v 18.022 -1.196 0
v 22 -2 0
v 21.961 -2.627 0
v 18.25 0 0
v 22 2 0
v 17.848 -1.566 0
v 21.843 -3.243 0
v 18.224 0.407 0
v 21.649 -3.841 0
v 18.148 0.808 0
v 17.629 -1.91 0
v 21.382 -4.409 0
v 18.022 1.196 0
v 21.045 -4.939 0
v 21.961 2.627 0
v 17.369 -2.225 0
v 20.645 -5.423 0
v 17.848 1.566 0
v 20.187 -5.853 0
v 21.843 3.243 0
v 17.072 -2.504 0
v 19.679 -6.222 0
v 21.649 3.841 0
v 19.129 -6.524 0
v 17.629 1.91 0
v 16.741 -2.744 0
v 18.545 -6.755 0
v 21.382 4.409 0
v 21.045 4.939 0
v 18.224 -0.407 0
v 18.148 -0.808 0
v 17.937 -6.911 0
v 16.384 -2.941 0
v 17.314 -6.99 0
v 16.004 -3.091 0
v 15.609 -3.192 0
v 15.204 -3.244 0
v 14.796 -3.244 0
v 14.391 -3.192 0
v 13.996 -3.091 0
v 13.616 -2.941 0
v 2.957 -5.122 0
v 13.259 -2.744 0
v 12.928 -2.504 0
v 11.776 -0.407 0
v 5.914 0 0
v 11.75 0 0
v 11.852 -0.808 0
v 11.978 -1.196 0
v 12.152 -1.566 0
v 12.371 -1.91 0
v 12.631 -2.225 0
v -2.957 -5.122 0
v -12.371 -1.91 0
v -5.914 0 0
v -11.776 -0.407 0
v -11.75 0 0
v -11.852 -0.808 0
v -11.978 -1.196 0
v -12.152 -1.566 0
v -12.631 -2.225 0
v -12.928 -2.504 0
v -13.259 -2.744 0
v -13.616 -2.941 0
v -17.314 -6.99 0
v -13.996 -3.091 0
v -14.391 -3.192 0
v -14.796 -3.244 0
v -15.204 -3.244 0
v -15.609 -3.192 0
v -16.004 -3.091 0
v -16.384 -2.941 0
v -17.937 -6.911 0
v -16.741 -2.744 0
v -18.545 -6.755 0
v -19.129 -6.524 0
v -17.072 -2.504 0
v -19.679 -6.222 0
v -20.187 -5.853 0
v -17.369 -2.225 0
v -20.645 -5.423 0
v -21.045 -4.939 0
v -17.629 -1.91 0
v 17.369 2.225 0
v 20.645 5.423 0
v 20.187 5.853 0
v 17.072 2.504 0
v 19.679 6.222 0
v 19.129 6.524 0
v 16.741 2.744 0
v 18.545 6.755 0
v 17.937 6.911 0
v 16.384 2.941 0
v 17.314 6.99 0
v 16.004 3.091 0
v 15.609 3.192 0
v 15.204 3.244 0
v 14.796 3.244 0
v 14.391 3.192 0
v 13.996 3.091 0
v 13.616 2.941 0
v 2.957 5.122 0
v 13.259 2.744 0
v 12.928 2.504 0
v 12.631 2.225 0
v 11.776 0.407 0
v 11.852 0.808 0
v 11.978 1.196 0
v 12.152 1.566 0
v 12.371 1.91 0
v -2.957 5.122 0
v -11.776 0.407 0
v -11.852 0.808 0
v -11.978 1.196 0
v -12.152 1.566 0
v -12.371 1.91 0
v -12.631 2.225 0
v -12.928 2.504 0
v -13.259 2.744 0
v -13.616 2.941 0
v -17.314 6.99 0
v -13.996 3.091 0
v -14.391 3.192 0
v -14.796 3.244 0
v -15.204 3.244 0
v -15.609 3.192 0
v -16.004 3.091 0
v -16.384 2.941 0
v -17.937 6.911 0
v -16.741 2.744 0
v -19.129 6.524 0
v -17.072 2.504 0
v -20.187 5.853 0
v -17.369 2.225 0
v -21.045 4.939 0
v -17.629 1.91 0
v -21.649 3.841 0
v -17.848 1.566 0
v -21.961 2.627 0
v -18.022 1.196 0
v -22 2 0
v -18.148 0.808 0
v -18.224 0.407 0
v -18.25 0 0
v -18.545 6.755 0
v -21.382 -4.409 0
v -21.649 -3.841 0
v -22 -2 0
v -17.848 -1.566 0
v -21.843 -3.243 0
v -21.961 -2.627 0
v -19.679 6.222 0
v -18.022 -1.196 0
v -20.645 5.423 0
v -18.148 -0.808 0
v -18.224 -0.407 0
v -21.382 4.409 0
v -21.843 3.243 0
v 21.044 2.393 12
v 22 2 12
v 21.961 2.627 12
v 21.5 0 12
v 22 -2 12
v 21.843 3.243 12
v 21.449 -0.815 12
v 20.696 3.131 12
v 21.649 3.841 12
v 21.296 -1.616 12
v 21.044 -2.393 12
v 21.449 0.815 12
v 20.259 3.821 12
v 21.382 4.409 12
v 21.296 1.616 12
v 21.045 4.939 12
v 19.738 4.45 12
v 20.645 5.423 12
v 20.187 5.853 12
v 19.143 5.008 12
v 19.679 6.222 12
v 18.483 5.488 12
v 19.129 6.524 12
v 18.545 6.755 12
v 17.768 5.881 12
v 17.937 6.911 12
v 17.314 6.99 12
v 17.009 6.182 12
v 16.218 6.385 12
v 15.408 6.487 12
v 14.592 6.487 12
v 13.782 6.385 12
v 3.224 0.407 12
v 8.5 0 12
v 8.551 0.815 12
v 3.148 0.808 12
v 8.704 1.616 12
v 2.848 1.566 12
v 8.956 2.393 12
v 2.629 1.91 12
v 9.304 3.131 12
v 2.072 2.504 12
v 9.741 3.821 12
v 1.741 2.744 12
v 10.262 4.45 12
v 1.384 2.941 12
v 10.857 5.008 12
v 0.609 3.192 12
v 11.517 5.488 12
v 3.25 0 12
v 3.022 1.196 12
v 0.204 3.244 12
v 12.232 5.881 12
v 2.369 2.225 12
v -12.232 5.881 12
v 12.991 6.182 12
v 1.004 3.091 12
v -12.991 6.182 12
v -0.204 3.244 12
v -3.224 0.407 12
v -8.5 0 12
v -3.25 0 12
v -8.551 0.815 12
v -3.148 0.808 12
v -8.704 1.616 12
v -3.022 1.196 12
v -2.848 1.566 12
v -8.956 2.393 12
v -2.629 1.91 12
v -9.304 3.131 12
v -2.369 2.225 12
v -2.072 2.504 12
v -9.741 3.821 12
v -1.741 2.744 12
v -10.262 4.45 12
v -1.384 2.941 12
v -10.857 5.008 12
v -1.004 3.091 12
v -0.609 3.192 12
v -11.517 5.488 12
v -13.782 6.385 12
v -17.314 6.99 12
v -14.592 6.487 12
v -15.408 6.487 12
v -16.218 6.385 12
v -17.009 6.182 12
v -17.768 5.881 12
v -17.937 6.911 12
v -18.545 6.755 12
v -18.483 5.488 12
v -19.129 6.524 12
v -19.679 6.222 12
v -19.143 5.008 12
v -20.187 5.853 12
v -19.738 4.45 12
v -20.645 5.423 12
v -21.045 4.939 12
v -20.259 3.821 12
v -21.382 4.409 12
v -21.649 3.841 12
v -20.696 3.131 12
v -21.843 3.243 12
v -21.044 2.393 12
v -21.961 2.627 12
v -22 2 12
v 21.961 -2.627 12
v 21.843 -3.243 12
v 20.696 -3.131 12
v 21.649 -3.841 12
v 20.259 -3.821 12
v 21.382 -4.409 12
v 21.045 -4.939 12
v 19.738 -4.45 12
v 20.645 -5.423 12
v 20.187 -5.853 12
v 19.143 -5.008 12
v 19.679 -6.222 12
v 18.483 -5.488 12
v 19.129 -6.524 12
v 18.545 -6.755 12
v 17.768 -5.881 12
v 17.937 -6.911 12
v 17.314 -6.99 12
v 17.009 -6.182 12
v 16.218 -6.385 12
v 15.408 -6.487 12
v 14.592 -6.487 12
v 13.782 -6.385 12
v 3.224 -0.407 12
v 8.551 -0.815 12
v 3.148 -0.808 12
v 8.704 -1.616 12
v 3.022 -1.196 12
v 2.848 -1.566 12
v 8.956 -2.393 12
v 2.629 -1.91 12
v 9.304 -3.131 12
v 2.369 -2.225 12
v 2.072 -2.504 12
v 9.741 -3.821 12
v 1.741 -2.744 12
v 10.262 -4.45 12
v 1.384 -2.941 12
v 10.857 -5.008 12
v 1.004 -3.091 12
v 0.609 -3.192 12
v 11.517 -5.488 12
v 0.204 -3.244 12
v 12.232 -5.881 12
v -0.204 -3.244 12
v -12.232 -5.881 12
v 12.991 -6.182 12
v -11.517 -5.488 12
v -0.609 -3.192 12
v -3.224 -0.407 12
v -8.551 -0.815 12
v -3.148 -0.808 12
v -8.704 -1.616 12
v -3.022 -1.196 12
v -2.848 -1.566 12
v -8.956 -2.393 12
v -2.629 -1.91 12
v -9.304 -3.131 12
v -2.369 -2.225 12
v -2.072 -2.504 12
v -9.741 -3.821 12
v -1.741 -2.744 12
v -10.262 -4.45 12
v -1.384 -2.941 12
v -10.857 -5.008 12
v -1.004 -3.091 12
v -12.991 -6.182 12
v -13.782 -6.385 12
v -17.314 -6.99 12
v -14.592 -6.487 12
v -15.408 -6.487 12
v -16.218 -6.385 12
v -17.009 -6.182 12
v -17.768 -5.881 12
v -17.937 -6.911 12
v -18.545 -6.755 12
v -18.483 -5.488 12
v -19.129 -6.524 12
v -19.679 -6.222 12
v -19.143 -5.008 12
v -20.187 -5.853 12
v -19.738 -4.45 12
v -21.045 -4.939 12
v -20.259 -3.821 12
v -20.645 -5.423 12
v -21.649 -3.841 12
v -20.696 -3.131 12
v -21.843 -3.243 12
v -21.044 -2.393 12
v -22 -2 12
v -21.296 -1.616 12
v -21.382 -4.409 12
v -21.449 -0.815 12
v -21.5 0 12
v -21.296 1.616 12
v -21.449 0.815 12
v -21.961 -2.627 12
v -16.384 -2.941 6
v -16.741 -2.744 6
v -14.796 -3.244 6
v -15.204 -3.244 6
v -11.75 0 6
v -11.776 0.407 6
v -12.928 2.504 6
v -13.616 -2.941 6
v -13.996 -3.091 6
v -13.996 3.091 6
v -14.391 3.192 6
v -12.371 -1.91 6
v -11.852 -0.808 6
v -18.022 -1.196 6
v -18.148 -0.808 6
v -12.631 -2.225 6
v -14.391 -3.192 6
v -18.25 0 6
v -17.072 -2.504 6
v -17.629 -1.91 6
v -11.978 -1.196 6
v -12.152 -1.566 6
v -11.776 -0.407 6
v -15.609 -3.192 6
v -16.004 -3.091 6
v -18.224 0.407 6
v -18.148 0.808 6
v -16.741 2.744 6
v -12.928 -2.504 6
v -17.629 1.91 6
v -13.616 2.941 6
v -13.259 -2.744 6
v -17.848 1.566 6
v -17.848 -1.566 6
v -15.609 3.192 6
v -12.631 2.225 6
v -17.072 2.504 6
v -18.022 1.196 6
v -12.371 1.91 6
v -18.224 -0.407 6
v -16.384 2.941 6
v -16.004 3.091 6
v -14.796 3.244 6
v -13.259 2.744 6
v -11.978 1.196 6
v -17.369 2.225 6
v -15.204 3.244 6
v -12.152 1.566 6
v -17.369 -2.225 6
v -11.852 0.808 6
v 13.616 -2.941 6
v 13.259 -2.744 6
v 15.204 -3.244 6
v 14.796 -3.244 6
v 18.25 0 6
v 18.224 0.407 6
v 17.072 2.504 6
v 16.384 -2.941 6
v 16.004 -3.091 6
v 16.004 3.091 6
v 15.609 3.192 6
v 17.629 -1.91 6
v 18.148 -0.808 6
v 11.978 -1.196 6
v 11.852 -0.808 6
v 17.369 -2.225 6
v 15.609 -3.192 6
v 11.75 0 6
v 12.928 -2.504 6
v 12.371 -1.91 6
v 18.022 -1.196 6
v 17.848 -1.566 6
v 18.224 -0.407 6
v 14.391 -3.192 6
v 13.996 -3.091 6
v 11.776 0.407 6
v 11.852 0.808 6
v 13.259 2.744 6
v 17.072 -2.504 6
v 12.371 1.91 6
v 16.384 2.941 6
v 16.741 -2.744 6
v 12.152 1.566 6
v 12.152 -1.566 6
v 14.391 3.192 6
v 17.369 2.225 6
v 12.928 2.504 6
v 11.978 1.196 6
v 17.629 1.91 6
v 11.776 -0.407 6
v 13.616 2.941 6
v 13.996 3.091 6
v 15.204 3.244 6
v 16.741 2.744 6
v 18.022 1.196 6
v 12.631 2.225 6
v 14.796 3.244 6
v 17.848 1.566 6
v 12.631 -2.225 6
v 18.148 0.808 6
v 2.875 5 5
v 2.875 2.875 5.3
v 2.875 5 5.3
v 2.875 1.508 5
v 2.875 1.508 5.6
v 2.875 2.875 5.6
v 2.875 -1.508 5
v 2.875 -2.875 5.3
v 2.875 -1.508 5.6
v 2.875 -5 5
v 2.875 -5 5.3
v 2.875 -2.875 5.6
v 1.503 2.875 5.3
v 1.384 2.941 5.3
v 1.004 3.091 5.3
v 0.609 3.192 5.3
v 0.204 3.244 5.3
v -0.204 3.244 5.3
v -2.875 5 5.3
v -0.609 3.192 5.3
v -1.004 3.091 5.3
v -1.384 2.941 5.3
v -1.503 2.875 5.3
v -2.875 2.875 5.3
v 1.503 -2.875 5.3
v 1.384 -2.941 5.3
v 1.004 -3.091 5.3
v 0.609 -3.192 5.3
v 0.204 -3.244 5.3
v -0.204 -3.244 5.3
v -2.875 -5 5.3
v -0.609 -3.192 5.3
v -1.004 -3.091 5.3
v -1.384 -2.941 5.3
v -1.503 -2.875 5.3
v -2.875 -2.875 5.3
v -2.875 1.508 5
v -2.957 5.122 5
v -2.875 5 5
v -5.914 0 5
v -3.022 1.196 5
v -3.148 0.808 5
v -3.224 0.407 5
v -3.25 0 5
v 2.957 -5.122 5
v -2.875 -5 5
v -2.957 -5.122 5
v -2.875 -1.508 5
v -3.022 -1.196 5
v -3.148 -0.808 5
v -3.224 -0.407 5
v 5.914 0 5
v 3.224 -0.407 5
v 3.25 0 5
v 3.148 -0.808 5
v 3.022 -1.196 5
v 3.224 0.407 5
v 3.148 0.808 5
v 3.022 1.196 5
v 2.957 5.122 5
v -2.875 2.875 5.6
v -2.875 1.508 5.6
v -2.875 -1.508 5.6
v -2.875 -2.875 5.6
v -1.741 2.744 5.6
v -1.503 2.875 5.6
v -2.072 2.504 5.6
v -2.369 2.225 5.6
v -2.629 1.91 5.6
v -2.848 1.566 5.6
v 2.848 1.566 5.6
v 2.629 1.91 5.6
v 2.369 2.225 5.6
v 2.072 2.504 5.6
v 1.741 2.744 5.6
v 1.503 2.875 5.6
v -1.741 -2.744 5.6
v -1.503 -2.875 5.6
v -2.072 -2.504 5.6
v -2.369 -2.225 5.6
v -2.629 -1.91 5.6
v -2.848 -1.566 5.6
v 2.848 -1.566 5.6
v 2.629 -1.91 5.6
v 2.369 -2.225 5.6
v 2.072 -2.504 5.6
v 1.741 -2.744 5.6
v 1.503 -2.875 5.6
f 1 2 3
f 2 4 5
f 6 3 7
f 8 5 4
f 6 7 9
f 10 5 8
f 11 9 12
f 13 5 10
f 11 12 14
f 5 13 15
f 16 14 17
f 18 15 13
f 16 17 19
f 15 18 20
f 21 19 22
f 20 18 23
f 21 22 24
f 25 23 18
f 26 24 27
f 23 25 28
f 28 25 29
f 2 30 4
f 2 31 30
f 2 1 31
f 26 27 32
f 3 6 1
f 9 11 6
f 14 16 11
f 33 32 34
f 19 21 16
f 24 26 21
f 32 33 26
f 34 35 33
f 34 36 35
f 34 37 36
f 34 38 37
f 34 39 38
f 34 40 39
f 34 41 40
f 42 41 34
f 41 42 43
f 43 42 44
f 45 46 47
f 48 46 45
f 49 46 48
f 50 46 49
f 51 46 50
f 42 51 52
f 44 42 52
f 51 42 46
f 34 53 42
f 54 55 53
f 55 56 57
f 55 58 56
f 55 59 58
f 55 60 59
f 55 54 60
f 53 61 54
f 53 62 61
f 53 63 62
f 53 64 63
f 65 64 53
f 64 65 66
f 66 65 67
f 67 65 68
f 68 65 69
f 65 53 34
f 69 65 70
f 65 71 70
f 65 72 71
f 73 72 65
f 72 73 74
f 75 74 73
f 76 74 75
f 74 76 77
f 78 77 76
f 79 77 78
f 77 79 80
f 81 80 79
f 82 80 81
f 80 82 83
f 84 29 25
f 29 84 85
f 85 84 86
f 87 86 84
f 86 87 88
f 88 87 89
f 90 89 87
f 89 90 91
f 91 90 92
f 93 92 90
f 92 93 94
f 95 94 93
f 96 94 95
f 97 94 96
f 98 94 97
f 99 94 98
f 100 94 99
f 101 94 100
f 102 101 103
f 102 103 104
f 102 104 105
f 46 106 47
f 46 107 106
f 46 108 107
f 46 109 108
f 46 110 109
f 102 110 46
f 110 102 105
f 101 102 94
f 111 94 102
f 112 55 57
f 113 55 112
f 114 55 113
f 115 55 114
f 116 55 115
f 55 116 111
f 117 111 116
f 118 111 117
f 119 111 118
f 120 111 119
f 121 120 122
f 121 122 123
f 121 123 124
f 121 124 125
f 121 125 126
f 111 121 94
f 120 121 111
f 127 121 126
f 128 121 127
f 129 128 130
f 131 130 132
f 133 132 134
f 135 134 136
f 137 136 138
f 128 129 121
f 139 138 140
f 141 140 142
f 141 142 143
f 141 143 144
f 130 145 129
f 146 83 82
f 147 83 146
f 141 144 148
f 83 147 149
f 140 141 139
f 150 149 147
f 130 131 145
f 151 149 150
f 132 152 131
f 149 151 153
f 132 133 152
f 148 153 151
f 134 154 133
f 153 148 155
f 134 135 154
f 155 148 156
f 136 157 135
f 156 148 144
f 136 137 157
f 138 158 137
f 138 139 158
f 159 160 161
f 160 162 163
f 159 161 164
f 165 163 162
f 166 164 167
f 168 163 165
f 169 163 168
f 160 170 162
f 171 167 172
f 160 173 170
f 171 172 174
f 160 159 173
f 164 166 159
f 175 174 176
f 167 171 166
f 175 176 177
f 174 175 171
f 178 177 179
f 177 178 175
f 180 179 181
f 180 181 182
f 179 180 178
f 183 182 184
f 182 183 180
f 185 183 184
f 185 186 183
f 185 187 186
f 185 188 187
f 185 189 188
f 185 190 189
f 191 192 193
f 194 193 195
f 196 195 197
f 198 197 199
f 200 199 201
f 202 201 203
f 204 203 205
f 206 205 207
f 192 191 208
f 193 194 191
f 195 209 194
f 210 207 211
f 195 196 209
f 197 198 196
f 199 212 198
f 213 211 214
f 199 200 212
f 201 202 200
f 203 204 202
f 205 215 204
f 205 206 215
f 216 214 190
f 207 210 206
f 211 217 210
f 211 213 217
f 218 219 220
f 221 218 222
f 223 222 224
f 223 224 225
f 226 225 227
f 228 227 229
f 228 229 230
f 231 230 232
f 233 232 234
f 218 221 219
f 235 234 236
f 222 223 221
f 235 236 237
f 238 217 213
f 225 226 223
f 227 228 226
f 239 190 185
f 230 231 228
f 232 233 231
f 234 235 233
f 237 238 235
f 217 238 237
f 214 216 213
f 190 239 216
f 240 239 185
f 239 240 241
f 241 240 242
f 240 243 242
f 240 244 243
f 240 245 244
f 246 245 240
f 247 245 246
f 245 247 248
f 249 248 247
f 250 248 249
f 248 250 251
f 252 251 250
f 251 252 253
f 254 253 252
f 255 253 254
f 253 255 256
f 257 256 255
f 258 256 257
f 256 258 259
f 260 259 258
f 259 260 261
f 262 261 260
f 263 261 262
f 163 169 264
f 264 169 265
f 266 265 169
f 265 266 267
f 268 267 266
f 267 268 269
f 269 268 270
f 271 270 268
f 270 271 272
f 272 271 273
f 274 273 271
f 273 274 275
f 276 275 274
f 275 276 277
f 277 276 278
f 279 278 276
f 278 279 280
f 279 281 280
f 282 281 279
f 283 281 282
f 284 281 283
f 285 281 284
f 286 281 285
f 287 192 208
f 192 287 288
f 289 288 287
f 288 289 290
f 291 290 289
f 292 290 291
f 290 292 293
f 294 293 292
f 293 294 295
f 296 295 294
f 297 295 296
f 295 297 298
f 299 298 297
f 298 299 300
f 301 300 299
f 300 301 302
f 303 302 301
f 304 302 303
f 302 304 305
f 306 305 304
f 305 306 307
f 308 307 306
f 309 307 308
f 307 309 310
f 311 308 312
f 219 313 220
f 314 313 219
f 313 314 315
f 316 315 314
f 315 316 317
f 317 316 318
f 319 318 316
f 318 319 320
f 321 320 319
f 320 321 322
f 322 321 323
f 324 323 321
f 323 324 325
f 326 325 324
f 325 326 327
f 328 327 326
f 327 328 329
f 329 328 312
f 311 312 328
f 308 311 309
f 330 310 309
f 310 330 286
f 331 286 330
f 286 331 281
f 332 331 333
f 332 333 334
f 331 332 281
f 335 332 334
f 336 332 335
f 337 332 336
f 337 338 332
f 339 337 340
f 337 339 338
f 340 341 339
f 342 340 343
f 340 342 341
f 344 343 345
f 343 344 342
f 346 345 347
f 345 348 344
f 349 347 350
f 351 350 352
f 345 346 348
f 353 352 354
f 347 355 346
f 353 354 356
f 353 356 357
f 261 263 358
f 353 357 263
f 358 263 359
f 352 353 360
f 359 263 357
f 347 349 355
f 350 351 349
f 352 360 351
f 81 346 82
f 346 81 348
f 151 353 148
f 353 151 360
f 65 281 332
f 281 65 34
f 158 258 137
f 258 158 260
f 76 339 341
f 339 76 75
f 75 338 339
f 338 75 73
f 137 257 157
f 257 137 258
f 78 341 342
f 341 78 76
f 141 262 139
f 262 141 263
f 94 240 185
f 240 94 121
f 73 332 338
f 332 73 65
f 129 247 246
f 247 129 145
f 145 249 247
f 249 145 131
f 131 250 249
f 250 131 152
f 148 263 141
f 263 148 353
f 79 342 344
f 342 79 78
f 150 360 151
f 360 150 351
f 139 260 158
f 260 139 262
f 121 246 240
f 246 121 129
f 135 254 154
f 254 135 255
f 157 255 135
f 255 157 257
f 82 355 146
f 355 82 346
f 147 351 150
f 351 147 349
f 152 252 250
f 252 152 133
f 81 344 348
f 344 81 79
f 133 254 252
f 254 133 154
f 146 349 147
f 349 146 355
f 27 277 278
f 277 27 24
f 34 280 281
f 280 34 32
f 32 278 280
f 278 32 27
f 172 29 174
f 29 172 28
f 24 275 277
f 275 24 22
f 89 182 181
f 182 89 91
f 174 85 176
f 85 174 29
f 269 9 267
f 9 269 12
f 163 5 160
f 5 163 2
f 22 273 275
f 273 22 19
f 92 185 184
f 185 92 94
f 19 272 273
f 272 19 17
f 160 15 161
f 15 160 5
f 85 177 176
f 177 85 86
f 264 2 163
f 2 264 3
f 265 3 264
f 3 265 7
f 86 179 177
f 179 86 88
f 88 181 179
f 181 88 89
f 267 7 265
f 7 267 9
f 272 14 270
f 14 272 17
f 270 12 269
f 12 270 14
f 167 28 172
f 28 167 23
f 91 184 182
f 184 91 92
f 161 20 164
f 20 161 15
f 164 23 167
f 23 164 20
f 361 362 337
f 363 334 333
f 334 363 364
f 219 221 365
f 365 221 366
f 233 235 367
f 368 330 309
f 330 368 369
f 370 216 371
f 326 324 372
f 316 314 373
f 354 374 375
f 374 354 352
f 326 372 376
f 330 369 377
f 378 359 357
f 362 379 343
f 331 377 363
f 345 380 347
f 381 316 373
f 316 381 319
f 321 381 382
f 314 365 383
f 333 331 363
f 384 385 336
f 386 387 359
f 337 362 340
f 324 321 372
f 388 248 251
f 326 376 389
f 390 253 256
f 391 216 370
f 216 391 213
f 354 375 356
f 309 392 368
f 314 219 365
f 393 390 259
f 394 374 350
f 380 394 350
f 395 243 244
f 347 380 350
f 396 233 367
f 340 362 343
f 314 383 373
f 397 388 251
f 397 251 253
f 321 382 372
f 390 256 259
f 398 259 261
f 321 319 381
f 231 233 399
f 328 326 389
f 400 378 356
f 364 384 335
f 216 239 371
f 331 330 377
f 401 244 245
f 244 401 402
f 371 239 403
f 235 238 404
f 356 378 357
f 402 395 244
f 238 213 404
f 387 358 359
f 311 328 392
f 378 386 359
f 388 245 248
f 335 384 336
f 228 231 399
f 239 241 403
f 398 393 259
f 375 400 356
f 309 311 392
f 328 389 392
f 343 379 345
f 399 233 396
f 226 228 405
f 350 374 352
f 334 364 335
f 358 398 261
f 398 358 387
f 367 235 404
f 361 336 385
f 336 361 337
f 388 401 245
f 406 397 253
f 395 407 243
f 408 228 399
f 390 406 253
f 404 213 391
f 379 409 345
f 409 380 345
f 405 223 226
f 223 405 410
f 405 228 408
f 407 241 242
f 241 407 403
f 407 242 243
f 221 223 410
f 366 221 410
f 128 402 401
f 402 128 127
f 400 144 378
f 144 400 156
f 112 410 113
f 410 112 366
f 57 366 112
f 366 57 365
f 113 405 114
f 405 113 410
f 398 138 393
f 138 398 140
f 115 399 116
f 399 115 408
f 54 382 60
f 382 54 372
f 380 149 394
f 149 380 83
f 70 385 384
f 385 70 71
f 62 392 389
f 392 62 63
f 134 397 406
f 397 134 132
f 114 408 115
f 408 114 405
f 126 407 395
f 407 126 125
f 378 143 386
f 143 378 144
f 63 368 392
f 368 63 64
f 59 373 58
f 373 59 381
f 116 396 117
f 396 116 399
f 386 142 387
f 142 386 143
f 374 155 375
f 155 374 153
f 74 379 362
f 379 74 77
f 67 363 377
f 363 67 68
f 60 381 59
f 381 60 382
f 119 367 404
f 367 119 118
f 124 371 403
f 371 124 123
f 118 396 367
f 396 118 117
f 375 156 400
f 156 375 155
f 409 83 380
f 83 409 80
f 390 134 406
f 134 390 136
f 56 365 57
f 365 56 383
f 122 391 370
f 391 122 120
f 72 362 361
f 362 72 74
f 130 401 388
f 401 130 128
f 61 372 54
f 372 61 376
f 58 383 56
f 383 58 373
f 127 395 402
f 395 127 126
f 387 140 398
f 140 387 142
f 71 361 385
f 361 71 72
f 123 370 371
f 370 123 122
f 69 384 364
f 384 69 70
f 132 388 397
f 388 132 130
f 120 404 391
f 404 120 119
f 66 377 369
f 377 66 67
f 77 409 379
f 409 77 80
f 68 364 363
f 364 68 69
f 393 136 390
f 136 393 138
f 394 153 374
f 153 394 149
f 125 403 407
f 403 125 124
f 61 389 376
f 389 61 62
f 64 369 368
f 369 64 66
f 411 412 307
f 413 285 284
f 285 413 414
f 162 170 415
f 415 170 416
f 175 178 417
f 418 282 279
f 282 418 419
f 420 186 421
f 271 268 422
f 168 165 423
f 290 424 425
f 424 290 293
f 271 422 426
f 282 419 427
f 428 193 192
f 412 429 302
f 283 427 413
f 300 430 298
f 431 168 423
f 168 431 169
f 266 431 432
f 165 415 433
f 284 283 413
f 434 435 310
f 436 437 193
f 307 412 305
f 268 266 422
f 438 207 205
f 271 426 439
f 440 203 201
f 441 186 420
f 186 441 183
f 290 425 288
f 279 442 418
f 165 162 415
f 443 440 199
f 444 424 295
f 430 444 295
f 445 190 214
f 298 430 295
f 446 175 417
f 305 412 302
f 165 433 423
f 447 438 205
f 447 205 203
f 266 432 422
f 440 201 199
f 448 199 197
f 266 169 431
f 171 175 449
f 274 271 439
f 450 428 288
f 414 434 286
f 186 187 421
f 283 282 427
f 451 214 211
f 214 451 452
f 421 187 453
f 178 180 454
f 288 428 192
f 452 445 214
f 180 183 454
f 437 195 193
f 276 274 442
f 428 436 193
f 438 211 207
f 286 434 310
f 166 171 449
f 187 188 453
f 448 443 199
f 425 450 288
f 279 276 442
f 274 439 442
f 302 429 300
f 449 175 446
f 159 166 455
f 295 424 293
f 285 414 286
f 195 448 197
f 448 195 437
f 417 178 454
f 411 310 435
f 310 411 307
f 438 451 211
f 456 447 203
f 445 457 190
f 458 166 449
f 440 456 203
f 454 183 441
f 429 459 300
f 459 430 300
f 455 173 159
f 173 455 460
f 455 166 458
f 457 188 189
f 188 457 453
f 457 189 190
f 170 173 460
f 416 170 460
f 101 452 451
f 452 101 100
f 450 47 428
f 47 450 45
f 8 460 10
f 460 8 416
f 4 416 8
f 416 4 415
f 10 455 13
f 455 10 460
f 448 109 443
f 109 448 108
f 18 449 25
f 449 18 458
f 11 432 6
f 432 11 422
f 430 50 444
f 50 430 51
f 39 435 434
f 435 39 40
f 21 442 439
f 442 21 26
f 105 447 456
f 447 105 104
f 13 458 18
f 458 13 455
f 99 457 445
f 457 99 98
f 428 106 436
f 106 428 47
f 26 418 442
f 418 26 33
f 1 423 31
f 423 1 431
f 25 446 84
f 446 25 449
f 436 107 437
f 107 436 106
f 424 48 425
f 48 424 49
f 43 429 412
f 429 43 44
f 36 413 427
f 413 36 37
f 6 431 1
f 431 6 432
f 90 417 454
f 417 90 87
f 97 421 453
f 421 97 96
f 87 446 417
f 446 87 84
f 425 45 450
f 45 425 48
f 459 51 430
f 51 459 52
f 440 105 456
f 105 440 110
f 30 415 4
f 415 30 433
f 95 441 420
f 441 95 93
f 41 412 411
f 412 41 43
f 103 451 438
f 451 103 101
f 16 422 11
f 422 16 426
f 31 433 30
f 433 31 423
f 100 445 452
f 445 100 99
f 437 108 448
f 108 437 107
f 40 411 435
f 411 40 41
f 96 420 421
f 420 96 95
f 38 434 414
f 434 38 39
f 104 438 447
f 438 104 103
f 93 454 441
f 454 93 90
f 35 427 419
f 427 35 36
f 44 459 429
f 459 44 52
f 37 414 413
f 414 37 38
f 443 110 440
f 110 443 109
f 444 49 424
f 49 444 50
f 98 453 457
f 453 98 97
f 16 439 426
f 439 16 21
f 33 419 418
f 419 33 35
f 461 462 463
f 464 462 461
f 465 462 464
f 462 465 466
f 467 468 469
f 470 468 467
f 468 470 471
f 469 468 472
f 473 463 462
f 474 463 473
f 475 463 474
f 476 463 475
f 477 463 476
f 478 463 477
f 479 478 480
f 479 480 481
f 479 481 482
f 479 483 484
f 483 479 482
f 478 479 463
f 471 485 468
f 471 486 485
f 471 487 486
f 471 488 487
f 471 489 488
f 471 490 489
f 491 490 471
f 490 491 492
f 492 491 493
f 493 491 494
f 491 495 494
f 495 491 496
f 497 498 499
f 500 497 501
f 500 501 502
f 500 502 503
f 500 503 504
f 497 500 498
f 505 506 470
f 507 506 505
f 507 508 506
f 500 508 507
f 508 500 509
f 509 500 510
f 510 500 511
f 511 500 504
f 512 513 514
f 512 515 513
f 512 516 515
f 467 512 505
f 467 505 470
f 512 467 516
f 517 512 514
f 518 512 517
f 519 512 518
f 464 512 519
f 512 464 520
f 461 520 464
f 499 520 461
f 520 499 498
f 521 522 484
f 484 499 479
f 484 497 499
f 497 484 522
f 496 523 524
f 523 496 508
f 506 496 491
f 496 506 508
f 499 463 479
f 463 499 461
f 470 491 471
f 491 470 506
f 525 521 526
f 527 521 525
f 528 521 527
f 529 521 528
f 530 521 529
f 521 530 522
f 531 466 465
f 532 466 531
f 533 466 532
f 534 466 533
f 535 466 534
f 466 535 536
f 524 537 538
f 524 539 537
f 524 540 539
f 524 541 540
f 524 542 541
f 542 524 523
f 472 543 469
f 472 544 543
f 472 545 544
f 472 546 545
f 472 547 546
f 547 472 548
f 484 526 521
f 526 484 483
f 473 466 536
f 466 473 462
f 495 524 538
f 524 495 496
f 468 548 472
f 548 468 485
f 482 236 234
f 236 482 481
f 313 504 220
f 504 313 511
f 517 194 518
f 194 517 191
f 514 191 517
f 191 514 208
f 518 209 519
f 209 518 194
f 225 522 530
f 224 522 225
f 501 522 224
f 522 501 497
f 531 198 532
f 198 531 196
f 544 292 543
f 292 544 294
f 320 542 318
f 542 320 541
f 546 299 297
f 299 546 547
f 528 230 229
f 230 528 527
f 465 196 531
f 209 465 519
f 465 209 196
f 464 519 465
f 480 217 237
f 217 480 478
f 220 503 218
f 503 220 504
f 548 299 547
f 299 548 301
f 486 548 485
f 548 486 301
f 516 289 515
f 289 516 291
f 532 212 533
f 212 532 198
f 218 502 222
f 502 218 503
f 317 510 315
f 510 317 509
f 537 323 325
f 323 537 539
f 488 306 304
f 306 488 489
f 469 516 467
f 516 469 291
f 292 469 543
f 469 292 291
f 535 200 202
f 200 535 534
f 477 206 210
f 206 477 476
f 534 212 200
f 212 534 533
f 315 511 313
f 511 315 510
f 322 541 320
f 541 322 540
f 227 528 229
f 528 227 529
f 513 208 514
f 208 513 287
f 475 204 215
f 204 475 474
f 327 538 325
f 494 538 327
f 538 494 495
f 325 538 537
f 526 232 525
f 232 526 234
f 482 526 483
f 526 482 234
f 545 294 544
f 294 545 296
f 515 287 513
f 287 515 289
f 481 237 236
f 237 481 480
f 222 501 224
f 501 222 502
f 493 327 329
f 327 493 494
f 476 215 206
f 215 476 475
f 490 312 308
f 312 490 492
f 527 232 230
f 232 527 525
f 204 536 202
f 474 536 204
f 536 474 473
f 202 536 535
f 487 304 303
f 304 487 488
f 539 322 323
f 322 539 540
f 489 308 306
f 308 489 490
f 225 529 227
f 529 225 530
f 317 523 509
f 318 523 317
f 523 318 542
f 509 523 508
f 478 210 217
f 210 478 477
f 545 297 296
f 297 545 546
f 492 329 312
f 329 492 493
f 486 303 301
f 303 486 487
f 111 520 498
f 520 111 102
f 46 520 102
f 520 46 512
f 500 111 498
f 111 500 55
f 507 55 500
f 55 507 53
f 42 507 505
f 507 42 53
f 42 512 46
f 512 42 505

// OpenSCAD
$fn = 50;


difference() {
	union() {
		cylinder(h = 12, r = 7.0000000000);
		translate(v = [-7.5000000000, 0.0000000000, 0]) {
			hull() {
				translate(v = [-9.5000000000, 2.0000000000, 0]) {
					cylinder(h = 12, r = 5);
				}
				translate(v = [9.5000000000, 2.0000000000, 0]) {
					cylinder(h = 12, r = 5);
				}
				translate(v = [-9.5000000000, -2.0000000000, 0]) {
					cylinder(h = 12, r = 5);
				}
				translate(v = [9.5000000000, -2.0000000000, 0]) {
					cylinder(h = 12, r = 5);
				}
			}
		}
		translate(v = [-7.5000000000, 0.0000000000, 0]) {
			hull() {
				translate(v = [-9.5000000000, 2.0000000000, 0]) {
					cylinder(h = 12, r = 5);
				}
				translate(v = [9.5000000000, 2.0000000000, 0]) {
					cylinder(h = 12, r = 5);
				}
				translate(v = [-9.5000000000, -2.0000000000, 0]) {
					cylinder(h = 12, r = 5);
				}
				translate(v = [9.5000000000, -2.0000000000, 0]) {
					cylinder(h = 12, r = 5);
				}
			}
		}
		translate(v = [7.5000000000, 0.0000000000, 0]) {
			hull() {
				translate(v = [-9.5000000000, 2.0000000000, 0]) {
					cylinder(h = 12, r = 5);
				}
				translate(v = [9.5000000000, 2.0000000000, 0]) {
					cylinder(h = 12, r = 5);
				}
				translate(v = [-9.5000000000, -2.0000000000, 0]) {
					cylinder(h = 12, r = 5);
				}
				translate(v = [9.5000000000, -2.0000000000, 0]) {
					cylinder(h = 12, r = 5);
				}
			}
		}
		translate(v = [7.5000000000, 0.0000000000, 0]) {
			hull() {
				translate(v = [-9.5000000000, 2.0000000000, 0]) {
					cylinder(h = 12, r = 5);
				}
				translate(v = [9.5000000000, 2.0000000000, 0]) {
					cylinder(h = 12, r = 5);
				}
				translate(v = [-9.5000000000, -2.0000000000, 0]) {
					cylinder(h = 12, r = 5);
				}
				translate(v = [9.5000000000, -2.0000000000, 0]) {
					cylinder(h = 12, r = 5);
				}
			}
		}
	}
	union() {
		translate(v = [-15.0000000000, 0.0000000000, 12]) {
			rotate(a = [0, 0, 0]) {
				difference() {
					union() {
						#translate(v = [0, 0, -12.0000000000]) {
							cylinder(h = 12, r = 2.2500000000);
						}
						#translate(v = [0, 0, -6]) {
							cylinder(h = 6, r1 = 3.2500000000, r2 = 6.5000000000);
						}
						#translate(v = [0, 0, -12.0000000000]) {
							cylinder(h = 12, r = 3.2500000000);
						}
						#translate(v = [0, 0, -12.0000000000]) {
							cylinder(h = 12, r = 2.2500000000);
						}
					}
					union();
				}
			}
		}
		translate(v = [-15.0000000000, 0.0000000000, 12]) {
			rotate(a = [0, 0, 0]) {
				difference() {
					union() {
						#translate(v = [0, 0, -12.0000000000]) {
							cylinder(h = 12, r = 2.2500000000);
						}
						#translate(v = [0, 0, -6]) {
							cylinder(h = 6, r1 = 3.2500000000, r2 = 6.5000000000);
						}
						#translate(v = [0, 0, -12.0000000000]) {
							cylinder(h = 12, r = 3.2500000000);
						}
						#translate(v = [0, 0, -12.0000000000]) {
							cylinder(h = 12, r = 2.2500000000);
						}
					}
					union();
				}
			}
		}
		translate(v = [15.0000000000, 0.0000000000, 12]) {
			rotate(a = [0, 0, 0]) {
				difference() {
					union() {
						#translate(v = [0, 0, -12.0000000000]) {
							cylinder(h = 12, r = 2.2500000000);
						}
						#translate(v = [0, 0, -6]) {
							cylinder(h = 6, r1 = 3.2500000000, r2 = 6.5000000000);
						}
						#translate(v = [0, 0, -12.0000000000]) {
							cylinder(h = 12, r = 3.2500000000);
						}
						#translate(v = [0, 0, -12.0000000000]) {
							cylinder(h = 12, r = 2.2500000000);
						}
					}
					union();
				}
			}
		}
		translate(v = [15.0000000000, 0.0000000000, 12]) {
			rotate(a = [0, 0, 0]) {
				difference() {
					union() {
						#translate(v = [0, 0, -12.0000000000]) {
							cylinder(h = 12, r = 2.2500000000);
						}
						#translate(v = [0, 0, -6]) {
							cylinder(h = 6, r1 = 3.2500000000, r2 = 6.5000000000);
						}
						#translate(v = [0, 0, -12.0000000000]) {
							cylinder(h = 12, r = 3.2500000000);
						}
						#translate(v = [0, 0, -12.0000000000]) {
							cylinder(h = 12, r = 2.2500000000);
						}
					}
					union();
				}
			}
		}
		translate(v = [0.0000000000, 0.0000000000, 0]) {
			rotate(a = [0, 0, 0]) {
				difference() {
					union() {
						#translate(v = [-2.8750000000, -5.0000000000, -0.3000000000]) {
							cube(size = [5.7500000000, 10, 0.3000000000]);
						}
						#translate(v = [-2.8750000000, -2.8750000000, -0.6000000000]) {
							cube(size = [5.7500000000, 5.7500000000, 0.3000000000]);
						}
						#translate(v = [-2.8750000000, -5.0000000000, 5]) {
							cube(size = [5.7500000000, 10, 0.3000000000]);
						}
						#translate(v = [-2.8750000000, -2.8750000000, 5.3000000000]) {
							cube(size = [5.7500000000, 5.7500000000, 0.3000000000]);
						}
						#translate(v = [0, 0, -100.0000000000]) {
							cylinder(h = 200, r = 3.2500000000);
						}
						#linear_extrude(height = 5) {
							polygon(points = [[5.9142500000, 0.0000000000], [2.9571250000, 5.1218907443], [-2.9571250000, 5.1218907443], [-5.9142500000, 0.0000000000], [-2.9571250000, -5.1218907443], [2.9571250000, -5.1218907443]]);
						}
						#translate(v = [-2.8750000000, -5.0000000000, -0.3000000000]) {
							cube(size = [5.7500000000, 10, 0.3000000000]);
						}
						#translate(v = [-2.8750000000, -2.8750000000, -0.6000000000]) {
							cube(size = [5.7500000000, 5.7500000000, 0.3000000000]);
						}
						#translate(v = [-2.8750000000, -5.0000000000, 5]) {
							cube(size = [5.7500000000, 10, 0.3000000000]);
						}
						#translate(v = [-2.8750000000, -2.8750000000, 5.3000000000]) {
							cube(size = [5.7500000000, 5.7500000000, 0.3000000000]);
						}
						#translate(v = [0, 0, -100.0000000000]) {
							cylinder(h = 200, r = 3.2500000000);
						}
						#translate(v = [-2.8750000000, -5.0000000000, -0.3000000000]) {
							cube(size = [5.7500000000, 10, 0.3000000000]);
						}
						#translate(v = [-2.8750000000, -2.8750000000, -0.6000000000]) {
							cube(size = [5.7500000000, 5.7500000000, 0.3000000000]);
						}
						#translate(v = [-2.8750000000, -5.0000000000, 5]) {
							cube(size = [5.7500000000, 10, 0.3000000000]);
						}
						#translate(v = [-2.8750000000, -2.8750000000, 5.3000000000]) {
							cube(size = [5.7500000000, 5.7500000000, 0.3000000000]);
						}
						#translate(v = [0, 0, -100.0000000000]) {
							cylinder(h = 200, r = 3.2500000000);
						}
					}
					union();
				}
			}
		}
		translate(v = [0, 0, -100]) {
			cylinder(h = 200, r = 3.2500000000);
		}
		translate(v = [0, 0, -100]) {
			cylinder(h = 200, r = 1.8000000000);
		}
	}
}
